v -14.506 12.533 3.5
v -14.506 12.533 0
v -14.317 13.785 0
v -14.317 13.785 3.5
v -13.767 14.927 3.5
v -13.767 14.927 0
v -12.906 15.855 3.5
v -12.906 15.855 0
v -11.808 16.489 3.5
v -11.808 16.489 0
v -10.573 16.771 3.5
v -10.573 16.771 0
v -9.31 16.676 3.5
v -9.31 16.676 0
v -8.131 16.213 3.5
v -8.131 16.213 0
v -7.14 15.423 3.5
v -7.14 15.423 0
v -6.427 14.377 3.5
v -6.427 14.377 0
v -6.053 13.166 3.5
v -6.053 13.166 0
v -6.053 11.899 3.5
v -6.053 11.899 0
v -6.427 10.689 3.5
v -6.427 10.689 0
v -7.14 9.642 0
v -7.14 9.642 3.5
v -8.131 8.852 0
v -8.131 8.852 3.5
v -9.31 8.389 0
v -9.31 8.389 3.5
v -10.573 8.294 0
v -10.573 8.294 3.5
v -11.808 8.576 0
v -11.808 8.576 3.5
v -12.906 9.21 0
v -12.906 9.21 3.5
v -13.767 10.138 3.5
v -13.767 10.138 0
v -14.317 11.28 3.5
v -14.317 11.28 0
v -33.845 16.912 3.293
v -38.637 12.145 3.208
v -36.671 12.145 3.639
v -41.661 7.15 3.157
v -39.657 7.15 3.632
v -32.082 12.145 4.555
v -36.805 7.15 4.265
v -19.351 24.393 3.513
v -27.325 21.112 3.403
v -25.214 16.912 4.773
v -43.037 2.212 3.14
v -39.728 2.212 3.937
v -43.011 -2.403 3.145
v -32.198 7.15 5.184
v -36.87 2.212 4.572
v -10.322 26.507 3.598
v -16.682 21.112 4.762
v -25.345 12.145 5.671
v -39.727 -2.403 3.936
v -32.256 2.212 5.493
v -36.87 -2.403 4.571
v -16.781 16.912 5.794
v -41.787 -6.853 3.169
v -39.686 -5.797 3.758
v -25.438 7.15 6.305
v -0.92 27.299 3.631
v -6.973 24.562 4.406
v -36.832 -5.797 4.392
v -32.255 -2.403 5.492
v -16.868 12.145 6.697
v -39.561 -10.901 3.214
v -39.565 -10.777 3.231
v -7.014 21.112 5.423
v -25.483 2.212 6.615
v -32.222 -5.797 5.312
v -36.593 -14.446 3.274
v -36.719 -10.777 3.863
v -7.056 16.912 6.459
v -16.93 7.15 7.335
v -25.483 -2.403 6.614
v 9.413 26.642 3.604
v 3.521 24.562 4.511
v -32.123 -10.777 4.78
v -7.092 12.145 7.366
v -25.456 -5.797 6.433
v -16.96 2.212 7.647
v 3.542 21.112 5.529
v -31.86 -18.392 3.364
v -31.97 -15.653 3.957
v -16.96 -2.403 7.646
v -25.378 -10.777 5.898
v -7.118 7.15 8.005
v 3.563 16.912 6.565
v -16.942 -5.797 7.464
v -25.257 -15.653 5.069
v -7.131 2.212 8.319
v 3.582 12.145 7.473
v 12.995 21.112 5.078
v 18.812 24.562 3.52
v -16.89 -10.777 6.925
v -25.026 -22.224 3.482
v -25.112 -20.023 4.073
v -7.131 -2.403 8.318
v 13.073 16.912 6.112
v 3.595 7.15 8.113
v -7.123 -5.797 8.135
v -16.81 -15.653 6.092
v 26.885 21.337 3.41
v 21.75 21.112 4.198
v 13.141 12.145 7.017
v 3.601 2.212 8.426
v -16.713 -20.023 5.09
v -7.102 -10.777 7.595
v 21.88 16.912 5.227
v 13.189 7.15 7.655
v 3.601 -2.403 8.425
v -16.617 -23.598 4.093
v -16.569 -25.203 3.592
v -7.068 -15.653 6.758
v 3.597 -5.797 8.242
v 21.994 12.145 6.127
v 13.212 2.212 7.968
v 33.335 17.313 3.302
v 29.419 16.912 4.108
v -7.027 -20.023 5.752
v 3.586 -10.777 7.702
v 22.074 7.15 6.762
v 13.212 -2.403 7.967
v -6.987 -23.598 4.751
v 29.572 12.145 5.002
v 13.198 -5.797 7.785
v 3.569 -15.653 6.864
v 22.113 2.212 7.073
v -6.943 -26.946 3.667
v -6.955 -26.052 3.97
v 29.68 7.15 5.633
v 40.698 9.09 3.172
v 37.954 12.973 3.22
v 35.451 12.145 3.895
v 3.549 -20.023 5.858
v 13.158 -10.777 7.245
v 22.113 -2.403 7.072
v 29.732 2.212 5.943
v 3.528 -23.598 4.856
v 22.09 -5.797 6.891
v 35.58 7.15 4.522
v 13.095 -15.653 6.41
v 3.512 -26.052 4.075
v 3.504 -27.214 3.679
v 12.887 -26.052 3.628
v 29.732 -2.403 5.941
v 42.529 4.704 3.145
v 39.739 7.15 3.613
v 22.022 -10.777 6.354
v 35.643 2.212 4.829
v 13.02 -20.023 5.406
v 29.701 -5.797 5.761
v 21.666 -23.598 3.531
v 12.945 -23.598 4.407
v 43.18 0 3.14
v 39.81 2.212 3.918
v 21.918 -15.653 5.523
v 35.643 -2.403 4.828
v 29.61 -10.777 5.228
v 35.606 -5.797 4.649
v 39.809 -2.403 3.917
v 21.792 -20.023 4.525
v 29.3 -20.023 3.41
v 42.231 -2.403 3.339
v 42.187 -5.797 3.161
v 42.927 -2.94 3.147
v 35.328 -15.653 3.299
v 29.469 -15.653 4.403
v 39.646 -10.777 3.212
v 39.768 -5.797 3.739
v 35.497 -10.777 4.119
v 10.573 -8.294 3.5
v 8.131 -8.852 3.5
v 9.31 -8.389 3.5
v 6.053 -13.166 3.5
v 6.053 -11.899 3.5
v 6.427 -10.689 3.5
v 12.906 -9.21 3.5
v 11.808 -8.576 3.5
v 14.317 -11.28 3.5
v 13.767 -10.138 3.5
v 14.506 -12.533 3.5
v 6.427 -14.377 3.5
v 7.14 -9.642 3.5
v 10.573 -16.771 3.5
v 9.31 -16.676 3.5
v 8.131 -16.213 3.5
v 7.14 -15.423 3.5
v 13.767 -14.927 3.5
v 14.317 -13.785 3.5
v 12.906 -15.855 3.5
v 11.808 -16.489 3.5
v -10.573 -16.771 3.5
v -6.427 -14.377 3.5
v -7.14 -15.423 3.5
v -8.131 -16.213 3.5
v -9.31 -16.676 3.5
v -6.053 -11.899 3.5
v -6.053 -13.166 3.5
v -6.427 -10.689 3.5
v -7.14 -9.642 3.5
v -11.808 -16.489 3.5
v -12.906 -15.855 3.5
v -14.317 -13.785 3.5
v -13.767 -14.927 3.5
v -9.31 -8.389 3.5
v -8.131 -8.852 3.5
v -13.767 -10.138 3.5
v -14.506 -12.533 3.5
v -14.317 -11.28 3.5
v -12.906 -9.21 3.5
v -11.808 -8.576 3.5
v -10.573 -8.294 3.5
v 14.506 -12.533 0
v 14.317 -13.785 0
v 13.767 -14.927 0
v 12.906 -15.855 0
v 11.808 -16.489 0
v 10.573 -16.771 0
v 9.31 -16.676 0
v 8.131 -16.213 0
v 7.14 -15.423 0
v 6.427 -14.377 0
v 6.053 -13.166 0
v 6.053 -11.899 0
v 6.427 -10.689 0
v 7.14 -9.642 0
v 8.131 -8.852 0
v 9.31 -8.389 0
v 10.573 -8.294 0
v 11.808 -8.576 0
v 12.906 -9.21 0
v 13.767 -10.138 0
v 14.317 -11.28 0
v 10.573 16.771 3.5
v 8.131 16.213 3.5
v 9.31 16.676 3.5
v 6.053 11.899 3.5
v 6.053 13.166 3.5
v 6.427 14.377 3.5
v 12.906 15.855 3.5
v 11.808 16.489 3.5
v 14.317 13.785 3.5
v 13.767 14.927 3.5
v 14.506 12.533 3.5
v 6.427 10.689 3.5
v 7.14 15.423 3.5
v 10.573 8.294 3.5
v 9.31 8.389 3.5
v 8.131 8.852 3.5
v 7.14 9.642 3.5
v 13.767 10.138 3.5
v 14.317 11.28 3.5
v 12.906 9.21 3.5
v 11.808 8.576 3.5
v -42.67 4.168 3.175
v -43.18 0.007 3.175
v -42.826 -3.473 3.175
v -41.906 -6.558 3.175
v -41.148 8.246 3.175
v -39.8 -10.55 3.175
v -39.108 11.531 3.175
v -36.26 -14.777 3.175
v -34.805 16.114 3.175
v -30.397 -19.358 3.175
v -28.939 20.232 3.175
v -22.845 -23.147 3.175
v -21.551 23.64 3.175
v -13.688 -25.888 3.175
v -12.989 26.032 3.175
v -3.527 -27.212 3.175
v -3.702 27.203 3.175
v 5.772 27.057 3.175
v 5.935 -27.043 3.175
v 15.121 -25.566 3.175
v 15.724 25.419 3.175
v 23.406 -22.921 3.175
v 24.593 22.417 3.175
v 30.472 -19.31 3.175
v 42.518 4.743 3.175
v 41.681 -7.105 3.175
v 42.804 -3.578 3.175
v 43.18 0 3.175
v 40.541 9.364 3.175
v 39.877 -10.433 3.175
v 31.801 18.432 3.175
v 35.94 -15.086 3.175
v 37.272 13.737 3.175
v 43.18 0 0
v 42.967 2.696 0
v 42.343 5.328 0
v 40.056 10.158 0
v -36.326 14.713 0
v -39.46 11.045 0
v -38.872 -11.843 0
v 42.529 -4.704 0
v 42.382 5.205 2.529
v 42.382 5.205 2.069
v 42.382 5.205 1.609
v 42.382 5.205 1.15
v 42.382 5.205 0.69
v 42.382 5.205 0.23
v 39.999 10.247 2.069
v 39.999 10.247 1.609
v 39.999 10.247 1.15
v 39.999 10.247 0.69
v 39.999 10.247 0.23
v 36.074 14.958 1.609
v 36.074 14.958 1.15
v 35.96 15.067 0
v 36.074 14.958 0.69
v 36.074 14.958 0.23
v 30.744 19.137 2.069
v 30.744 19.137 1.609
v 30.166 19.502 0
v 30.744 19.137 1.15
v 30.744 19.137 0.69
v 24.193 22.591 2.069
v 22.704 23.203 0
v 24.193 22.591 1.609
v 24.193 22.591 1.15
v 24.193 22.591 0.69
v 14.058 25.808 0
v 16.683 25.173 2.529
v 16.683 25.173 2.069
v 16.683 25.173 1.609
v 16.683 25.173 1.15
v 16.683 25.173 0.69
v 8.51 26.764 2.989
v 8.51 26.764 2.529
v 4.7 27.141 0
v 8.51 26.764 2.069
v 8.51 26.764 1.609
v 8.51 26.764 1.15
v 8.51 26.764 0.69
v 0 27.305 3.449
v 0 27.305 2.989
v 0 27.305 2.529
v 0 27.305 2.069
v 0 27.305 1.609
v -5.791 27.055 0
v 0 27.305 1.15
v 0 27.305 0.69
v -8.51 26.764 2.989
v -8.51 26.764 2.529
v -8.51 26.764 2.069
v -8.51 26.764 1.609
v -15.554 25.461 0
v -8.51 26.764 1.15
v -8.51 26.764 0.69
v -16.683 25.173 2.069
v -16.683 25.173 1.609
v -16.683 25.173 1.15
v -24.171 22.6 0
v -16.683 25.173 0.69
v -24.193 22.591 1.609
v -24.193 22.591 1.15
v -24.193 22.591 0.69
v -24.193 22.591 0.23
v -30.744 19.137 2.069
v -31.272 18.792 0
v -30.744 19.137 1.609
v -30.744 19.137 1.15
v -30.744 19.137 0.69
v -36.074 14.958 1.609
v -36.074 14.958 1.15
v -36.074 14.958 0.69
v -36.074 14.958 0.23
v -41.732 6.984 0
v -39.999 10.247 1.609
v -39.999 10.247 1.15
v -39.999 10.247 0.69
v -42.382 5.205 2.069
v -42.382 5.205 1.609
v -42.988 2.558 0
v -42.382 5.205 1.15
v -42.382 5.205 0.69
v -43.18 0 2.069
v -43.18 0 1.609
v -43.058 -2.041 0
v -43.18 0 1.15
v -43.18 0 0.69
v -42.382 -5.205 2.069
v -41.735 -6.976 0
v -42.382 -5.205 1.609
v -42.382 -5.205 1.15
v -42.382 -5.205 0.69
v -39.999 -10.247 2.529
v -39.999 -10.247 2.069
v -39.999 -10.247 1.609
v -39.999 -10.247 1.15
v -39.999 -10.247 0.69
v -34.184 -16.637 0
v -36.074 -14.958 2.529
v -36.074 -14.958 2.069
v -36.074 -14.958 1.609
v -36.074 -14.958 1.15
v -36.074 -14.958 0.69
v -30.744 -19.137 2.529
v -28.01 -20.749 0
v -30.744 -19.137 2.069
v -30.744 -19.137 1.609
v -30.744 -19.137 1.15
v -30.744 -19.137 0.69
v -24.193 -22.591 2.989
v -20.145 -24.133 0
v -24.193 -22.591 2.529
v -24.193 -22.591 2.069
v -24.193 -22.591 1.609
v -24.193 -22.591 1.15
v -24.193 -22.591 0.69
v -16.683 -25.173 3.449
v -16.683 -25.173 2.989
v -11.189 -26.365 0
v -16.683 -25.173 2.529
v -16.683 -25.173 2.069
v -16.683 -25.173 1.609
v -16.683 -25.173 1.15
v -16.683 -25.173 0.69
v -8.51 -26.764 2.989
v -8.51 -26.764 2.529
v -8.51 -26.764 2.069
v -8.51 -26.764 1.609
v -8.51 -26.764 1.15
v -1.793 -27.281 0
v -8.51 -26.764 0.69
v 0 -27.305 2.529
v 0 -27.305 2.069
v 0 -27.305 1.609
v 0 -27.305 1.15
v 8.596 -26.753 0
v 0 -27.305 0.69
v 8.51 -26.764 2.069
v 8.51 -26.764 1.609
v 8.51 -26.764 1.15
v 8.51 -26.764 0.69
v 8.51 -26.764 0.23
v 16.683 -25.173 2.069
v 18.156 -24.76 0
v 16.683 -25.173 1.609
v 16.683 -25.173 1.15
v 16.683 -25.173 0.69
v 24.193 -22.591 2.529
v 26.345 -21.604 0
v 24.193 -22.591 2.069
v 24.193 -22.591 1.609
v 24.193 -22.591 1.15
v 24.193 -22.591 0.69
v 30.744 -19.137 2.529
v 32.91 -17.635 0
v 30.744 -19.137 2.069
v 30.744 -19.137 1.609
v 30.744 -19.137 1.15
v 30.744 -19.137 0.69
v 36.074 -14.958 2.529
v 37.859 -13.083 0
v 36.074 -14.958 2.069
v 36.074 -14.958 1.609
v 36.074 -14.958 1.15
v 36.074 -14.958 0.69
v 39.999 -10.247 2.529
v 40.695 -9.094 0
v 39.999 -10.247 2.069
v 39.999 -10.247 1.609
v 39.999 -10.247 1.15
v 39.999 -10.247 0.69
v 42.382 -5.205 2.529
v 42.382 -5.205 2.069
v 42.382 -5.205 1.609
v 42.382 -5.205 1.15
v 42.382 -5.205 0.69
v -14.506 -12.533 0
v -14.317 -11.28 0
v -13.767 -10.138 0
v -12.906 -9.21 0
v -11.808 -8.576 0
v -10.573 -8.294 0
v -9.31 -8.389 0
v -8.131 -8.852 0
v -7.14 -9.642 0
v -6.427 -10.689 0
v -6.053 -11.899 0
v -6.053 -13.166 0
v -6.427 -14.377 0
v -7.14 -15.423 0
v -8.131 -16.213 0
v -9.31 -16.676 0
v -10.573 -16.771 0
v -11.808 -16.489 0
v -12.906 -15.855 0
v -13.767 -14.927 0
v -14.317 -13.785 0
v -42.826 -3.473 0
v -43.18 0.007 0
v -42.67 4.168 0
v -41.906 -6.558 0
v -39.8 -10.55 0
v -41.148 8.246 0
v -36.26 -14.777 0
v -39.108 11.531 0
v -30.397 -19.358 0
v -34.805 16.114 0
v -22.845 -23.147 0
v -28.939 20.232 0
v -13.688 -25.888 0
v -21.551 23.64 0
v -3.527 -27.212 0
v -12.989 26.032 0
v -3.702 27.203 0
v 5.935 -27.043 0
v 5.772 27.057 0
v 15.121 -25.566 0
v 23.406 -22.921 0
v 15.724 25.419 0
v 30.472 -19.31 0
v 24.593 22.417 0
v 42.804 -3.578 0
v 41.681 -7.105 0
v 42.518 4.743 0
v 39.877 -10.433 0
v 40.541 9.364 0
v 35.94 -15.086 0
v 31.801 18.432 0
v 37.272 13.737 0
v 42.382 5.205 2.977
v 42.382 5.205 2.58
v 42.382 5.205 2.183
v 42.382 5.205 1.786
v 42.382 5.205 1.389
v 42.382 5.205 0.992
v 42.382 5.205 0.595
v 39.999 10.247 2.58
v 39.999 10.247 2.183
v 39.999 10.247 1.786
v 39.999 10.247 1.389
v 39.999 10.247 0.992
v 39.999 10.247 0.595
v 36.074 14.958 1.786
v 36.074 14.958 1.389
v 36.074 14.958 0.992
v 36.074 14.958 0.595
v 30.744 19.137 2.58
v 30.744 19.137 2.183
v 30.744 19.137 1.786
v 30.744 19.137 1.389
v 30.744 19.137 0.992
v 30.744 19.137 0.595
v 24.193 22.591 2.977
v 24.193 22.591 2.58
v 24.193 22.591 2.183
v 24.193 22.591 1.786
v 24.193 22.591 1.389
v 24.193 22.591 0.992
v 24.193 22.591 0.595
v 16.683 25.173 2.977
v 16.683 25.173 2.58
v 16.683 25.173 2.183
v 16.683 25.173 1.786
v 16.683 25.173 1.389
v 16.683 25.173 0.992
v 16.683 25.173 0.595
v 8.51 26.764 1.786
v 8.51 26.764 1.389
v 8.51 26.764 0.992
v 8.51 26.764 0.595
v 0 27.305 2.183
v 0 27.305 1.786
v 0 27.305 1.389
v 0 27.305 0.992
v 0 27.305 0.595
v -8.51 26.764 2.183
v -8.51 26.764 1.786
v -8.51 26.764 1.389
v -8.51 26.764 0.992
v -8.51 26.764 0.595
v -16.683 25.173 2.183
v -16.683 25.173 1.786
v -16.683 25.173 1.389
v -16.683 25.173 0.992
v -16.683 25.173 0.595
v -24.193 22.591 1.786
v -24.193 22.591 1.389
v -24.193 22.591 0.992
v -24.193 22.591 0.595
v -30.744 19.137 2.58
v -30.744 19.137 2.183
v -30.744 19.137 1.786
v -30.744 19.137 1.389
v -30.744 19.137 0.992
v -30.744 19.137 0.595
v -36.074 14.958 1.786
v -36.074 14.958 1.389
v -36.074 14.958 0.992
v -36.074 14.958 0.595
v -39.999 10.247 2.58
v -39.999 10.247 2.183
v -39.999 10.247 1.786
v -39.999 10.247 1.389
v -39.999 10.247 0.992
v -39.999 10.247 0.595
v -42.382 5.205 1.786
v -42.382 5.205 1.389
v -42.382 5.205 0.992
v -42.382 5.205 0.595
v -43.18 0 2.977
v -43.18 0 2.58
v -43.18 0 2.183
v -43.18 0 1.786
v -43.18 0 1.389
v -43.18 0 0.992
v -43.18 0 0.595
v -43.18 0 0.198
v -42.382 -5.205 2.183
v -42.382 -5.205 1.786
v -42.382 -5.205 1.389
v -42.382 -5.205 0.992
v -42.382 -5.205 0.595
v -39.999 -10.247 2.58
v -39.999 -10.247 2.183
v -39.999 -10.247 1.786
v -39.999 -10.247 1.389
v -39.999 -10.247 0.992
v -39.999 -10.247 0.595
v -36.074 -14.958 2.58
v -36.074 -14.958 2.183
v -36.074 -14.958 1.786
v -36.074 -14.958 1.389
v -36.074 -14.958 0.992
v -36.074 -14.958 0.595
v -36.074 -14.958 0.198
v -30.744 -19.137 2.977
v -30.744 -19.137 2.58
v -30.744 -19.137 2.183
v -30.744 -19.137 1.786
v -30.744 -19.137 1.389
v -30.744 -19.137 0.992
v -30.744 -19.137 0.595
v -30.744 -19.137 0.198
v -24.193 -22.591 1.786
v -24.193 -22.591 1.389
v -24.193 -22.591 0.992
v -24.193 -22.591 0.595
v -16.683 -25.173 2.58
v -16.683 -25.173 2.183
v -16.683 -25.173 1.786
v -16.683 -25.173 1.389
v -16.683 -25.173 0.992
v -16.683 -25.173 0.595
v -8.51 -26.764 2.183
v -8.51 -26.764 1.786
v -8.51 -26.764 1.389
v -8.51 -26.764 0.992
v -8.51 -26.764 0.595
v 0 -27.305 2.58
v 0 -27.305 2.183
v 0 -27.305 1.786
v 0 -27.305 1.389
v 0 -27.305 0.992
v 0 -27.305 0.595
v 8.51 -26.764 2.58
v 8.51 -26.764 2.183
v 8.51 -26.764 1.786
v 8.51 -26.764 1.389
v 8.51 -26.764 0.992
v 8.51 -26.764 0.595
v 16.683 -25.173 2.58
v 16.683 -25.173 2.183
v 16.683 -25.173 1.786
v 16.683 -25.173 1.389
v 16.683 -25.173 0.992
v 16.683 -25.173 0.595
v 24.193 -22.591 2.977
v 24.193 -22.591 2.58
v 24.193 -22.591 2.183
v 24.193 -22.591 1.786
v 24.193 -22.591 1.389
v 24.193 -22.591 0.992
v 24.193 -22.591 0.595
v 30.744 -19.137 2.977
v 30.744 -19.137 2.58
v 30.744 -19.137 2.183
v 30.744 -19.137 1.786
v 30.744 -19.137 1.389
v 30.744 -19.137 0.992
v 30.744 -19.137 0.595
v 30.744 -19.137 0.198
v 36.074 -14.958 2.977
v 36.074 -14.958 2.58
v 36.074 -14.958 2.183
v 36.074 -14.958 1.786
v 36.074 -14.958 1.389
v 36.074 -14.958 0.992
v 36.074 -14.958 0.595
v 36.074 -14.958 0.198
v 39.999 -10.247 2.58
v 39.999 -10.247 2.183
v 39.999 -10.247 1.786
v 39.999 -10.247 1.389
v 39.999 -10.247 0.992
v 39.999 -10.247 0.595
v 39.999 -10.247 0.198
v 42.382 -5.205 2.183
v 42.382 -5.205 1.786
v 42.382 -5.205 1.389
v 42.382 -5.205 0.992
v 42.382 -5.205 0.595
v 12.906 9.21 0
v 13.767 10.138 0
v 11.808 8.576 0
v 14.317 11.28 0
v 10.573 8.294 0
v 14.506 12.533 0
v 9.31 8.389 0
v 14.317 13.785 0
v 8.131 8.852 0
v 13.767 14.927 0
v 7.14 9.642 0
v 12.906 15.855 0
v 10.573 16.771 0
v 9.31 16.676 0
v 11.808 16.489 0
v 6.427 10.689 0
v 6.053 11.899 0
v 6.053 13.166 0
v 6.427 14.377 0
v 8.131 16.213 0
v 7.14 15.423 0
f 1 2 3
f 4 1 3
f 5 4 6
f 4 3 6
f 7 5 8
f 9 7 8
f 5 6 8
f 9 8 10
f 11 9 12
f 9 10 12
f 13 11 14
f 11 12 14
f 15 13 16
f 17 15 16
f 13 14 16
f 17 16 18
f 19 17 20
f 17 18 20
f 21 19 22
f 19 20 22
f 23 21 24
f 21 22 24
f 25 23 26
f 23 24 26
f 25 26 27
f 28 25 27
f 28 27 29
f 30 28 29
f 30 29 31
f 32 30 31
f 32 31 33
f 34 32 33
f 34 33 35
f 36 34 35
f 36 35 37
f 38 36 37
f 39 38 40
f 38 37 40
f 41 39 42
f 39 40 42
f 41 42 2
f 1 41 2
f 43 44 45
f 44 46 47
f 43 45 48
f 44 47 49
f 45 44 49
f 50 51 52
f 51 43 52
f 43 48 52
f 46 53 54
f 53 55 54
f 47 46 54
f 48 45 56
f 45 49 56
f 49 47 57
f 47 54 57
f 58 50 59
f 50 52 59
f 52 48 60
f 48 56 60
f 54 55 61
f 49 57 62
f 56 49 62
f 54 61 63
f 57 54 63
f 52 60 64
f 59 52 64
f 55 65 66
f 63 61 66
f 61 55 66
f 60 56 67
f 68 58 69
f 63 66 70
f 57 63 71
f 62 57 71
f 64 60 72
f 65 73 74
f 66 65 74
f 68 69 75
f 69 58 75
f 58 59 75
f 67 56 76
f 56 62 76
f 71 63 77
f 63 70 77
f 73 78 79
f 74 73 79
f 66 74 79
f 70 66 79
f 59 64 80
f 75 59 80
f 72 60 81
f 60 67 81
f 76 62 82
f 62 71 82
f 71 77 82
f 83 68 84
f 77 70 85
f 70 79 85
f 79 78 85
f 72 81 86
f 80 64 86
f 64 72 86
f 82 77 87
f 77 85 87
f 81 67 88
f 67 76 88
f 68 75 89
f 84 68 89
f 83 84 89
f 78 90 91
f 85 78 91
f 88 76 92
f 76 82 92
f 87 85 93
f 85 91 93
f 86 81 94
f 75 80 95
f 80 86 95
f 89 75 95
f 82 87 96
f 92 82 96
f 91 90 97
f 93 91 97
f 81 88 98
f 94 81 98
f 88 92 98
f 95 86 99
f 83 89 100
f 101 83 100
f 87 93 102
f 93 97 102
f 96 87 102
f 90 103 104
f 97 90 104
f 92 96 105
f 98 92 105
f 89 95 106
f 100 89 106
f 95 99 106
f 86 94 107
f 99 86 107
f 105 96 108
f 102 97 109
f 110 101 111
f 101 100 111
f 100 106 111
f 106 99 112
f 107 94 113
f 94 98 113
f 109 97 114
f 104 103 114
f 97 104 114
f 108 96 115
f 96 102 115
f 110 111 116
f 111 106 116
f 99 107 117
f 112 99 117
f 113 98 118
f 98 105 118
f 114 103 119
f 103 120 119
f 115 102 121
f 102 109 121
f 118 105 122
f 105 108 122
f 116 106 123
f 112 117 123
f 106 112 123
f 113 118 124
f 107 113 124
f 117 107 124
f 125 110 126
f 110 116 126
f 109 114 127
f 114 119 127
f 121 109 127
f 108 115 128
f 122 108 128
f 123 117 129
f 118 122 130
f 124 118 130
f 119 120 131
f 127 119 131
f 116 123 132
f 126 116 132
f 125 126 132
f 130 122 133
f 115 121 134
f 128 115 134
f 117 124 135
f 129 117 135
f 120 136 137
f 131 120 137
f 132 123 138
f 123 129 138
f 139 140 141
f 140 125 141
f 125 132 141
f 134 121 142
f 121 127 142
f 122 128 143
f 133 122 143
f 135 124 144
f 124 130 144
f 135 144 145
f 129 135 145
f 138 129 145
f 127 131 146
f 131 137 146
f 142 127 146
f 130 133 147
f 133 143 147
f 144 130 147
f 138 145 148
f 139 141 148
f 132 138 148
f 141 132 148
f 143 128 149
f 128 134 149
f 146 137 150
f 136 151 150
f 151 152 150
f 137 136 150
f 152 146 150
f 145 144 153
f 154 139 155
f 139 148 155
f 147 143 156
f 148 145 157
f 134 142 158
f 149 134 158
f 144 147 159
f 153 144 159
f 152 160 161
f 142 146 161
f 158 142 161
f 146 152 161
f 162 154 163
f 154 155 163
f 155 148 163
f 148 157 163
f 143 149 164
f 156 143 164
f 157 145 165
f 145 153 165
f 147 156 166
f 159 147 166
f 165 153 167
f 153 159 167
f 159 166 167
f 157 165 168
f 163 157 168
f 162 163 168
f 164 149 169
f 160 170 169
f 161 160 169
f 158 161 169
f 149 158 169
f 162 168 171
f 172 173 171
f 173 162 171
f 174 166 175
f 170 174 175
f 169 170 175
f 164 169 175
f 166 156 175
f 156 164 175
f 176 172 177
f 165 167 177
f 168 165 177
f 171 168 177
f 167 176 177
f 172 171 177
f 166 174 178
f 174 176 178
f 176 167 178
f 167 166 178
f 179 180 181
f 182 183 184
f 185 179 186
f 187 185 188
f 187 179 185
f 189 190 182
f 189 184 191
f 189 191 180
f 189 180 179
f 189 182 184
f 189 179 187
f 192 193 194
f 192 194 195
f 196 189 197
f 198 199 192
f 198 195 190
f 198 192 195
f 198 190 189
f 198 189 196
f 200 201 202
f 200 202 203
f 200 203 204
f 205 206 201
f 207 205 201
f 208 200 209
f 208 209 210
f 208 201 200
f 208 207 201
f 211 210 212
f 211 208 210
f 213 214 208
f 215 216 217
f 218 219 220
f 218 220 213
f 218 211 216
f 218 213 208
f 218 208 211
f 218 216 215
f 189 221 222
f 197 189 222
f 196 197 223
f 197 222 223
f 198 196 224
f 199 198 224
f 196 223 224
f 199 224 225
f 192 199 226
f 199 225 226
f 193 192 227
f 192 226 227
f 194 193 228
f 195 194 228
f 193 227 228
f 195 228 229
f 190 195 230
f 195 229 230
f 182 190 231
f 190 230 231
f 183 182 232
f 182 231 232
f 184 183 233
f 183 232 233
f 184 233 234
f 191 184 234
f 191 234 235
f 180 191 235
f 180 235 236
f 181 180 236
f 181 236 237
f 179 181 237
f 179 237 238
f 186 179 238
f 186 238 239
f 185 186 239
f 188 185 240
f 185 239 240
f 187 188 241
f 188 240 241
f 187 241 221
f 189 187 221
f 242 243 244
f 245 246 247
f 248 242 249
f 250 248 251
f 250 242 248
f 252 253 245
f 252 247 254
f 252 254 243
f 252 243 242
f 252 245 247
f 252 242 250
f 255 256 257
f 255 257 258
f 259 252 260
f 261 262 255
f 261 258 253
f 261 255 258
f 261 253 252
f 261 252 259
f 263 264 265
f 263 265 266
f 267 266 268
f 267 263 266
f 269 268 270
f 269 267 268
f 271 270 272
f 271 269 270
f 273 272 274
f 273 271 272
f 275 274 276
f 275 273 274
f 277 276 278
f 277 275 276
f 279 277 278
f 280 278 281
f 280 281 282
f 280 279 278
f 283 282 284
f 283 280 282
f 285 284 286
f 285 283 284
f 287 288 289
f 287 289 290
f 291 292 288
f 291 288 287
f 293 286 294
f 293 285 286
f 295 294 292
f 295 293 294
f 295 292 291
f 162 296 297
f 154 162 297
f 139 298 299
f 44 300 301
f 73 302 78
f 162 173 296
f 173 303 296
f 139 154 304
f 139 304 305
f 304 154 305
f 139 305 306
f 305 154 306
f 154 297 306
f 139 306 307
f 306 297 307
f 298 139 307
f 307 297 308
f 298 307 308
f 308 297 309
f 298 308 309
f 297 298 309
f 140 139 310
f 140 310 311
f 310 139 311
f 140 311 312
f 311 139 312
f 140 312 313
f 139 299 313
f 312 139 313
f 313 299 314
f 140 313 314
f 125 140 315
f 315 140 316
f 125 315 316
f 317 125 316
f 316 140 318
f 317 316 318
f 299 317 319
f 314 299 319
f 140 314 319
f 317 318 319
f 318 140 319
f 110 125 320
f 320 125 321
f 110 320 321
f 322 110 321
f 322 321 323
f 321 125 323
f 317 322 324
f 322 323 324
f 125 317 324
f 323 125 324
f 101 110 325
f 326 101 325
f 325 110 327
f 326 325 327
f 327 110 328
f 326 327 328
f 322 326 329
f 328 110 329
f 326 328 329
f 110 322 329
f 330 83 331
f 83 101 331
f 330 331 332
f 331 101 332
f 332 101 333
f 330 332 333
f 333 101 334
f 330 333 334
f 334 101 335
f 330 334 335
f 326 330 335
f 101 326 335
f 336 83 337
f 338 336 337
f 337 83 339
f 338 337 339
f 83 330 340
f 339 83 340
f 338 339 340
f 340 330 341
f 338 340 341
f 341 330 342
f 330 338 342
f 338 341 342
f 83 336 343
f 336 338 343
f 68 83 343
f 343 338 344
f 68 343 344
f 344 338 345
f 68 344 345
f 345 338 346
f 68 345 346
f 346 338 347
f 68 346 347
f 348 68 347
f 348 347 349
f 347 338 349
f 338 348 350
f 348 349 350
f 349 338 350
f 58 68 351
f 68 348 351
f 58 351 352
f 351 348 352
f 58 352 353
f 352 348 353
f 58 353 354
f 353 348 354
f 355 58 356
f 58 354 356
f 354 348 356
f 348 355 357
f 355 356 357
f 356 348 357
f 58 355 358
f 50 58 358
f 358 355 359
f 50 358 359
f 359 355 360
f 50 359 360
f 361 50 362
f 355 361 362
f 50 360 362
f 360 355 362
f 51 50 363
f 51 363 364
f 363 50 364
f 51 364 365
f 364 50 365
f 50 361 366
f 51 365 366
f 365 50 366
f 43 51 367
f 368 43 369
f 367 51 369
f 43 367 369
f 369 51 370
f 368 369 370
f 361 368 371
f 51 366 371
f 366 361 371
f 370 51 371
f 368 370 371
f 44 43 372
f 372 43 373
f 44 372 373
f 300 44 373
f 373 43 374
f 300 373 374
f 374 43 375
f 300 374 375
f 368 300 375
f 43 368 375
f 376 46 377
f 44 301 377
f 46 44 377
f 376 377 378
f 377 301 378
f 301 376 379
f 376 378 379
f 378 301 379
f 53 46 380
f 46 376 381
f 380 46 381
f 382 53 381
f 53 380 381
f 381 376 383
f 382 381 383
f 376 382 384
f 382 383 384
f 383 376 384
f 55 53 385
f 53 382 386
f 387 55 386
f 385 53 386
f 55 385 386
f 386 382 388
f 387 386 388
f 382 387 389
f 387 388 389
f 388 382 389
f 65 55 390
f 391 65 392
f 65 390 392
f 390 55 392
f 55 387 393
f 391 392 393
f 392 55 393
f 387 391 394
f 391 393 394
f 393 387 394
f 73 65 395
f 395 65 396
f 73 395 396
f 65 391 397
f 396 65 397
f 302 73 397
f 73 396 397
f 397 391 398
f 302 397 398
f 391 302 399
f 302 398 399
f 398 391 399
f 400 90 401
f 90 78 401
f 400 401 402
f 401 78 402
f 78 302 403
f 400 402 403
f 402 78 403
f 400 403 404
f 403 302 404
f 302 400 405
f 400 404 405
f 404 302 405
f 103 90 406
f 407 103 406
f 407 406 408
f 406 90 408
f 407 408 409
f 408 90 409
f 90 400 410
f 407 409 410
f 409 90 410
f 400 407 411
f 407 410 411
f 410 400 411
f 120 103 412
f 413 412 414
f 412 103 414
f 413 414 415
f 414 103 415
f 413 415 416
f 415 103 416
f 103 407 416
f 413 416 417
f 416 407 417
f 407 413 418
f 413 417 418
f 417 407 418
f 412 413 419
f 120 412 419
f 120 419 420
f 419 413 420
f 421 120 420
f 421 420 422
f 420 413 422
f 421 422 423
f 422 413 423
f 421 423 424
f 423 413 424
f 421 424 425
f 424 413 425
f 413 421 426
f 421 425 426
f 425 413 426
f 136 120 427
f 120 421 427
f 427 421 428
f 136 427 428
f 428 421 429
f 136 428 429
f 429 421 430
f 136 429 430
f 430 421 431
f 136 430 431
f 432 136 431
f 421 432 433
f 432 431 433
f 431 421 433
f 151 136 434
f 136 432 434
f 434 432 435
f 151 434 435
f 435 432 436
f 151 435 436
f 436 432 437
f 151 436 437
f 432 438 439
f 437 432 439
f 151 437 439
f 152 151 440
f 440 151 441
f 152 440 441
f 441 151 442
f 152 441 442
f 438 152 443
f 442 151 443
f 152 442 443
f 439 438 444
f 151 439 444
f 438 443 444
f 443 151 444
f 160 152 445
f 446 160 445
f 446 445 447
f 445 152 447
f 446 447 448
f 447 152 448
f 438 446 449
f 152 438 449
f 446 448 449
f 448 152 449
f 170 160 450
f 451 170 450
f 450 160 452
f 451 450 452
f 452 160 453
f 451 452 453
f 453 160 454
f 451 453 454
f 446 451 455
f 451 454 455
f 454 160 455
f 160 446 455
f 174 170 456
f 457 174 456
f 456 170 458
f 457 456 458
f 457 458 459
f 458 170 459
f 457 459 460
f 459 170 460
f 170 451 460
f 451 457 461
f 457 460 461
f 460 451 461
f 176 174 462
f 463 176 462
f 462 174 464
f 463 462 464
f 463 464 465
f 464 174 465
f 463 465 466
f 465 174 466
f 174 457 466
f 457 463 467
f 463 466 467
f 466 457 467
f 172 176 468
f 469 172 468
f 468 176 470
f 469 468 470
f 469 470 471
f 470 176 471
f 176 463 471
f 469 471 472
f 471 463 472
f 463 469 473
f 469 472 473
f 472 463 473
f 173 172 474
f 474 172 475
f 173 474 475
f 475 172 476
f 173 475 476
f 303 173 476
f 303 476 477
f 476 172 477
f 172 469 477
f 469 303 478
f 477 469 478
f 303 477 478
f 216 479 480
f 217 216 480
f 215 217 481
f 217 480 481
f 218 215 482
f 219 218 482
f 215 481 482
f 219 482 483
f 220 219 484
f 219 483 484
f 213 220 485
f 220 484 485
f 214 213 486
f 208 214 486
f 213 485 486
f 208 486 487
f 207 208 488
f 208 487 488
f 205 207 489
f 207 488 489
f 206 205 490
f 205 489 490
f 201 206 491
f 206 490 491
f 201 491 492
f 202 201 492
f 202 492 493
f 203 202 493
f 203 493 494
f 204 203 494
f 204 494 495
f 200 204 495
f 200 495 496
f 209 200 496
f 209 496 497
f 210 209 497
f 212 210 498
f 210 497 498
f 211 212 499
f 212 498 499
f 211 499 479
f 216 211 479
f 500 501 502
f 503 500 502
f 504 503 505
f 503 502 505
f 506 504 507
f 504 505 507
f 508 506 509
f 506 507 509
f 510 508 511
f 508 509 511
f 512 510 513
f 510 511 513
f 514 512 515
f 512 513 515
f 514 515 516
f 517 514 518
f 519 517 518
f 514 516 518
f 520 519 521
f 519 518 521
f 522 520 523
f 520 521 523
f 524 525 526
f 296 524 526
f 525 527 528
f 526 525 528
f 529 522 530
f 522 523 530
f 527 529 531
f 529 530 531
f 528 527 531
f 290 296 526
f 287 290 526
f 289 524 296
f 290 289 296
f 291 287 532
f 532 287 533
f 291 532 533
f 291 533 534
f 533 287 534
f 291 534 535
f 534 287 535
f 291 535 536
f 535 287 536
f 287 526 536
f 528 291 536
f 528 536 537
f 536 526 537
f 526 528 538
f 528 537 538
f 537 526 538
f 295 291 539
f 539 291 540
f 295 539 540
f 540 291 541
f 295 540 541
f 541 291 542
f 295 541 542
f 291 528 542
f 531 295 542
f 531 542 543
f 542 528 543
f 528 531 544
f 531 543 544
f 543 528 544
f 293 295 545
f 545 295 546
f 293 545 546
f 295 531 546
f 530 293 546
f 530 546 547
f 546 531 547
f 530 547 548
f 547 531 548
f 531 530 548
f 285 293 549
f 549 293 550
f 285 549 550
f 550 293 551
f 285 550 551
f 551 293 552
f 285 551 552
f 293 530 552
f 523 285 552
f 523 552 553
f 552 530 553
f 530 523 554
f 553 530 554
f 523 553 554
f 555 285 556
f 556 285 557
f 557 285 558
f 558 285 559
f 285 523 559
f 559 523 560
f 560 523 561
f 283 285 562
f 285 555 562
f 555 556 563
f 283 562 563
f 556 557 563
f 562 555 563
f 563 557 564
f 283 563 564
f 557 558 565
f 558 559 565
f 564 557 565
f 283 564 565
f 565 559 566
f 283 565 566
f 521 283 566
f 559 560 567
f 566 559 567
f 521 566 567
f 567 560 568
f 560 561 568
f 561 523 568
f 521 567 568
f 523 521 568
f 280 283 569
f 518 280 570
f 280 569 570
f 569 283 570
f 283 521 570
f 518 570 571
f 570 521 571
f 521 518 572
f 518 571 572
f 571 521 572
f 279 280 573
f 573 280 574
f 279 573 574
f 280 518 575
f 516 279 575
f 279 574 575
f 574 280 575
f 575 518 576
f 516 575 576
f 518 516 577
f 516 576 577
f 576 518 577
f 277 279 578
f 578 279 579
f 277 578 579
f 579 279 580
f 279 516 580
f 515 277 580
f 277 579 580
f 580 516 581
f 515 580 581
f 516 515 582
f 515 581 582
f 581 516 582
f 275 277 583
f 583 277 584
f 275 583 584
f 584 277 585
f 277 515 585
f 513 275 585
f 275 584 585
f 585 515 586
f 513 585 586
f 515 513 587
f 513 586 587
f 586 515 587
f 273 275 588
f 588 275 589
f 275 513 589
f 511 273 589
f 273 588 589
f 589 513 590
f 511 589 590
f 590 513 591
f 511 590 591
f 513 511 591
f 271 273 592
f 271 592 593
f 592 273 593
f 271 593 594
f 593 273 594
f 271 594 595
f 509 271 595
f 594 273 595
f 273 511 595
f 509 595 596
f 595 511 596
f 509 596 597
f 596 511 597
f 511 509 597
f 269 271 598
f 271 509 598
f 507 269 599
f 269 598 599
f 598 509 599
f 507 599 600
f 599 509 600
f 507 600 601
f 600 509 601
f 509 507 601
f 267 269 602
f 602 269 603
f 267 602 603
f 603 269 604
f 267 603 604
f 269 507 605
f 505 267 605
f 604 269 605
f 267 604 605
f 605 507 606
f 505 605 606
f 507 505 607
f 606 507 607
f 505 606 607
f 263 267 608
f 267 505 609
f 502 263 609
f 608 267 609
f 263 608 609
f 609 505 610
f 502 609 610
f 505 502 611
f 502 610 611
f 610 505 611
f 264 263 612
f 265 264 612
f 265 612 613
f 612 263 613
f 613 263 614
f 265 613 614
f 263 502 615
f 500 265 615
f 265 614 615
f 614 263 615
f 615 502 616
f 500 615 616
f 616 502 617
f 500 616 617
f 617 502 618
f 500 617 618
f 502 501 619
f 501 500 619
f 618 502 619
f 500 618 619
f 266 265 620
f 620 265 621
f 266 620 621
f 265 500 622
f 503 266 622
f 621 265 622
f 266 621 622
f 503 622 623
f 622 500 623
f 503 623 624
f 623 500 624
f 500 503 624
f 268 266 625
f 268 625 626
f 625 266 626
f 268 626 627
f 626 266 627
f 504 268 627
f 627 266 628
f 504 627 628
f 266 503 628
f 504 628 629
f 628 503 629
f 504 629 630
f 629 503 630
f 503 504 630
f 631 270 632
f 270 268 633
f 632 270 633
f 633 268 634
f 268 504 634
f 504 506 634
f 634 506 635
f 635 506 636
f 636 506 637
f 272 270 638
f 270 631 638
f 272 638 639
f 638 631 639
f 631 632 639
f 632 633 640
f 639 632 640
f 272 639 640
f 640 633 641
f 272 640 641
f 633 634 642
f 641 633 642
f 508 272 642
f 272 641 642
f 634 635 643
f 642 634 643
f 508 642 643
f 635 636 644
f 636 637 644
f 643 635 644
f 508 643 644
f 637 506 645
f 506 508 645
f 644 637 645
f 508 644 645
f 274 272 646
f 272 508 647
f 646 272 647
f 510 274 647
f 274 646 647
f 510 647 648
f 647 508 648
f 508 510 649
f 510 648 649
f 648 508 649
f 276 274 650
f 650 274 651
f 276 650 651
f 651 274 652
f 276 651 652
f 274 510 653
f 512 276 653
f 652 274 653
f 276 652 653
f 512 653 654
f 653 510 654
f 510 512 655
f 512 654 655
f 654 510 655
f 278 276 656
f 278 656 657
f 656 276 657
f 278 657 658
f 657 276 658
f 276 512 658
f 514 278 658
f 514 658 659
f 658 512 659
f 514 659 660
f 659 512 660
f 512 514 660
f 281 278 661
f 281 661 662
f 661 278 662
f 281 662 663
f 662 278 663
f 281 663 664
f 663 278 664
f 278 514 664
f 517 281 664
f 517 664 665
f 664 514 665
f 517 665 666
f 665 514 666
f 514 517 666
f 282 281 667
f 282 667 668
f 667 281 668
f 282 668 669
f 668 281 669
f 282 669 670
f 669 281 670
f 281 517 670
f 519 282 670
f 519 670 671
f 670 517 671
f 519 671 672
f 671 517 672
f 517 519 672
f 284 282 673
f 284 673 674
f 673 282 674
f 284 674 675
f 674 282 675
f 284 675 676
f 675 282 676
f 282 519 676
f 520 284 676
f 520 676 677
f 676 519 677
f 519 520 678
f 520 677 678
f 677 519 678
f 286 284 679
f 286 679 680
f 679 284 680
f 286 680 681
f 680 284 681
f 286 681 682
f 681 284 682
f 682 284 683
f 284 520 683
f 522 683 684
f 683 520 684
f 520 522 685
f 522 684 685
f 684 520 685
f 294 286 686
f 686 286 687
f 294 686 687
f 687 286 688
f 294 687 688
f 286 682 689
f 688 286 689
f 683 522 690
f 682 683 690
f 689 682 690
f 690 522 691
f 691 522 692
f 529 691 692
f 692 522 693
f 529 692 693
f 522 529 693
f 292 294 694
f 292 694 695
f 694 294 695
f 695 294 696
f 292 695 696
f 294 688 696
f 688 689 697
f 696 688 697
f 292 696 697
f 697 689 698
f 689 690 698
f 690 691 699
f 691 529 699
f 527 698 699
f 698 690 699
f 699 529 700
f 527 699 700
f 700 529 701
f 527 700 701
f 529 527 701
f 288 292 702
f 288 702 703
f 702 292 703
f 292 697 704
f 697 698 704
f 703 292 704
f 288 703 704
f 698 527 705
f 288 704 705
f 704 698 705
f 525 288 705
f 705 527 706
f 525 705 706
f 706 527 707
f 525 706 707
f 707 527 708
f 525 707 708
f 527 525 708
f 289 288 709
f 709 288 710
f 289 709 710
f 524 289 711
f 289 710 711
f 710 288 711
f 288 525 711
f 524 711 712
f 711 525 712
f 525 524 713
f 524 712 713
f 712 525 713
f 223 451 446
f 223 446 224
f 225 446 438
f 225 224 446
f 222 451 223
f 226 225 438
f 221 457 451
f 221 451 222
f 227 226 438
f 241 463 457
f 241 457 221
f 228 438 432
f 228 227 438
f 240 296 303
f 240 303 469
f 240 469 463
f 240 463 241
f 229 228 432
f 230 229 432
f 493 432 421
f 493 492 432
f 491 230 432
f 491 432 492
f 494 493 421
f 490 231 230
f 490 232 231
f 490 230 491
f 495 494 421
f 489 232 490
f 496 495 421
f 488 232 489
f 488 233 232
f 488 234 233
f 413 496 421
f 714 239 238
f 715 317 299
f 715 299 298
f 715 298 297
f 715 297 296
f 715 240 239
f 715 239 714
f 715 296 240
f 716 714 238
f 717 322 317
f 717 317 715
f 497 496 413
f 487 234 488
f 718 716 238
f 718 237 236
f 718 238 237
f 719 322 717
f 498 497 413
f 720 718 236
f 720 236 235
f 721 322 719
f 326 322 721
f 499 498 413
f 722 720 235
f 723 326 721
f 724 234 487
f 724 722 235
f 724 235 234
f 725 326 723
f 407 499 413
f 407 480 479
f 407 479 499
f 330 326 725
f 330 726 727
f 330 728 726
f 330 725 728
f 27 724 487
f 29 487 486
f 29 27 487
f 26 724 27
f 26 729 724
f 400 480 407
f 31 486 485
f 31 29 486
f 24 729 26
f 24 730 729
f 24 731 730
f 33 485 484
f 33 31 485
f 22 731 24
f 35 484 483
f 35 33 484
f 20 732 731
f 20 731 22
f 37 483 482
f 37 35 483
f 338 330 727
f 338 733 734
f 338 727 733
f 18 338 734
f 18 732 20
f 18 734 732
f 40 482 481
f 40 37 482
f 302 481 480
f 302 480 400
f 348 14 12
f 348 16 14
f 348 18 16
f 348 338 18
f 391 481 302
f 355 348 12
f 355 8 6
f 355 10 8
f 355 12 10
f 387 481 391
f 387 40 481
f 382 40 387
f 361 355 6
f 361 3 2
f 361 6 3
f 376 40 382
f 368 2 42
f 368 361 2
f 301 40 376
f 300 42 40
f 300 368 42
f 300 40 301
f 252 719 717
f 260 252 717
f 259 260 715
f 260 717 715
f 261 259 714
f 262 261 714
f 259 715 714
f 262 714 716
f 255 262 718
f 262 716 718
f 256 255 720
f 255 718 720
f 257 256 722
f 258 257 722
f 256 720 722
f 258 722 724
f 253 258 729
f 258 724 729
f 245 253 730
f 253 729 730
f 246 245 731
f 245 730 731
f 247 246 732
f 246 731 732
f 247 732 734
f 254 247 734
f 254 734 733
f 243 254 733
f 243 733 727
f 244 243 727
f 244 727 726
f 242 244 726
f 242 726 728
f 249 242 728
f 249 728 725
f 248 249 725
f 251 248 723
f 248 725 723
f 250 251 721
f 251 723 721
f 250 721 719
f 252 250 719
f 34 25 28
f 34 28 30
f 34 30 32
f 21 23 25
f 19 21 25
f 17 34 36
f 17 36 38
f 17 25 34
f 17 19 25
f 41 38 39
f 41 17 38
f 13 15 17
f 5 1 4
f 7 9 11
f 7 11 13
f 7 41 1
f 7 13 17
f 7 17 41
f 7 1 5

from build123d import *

# Parameters (mm, degrees)
BOSS_EXTRUDE1_DEPTH     = 3.175
SKETCH3_R               = 210.872545424
CUT_EXTRUDE1_DEPTH      = 524.129
CUT_EXTRUDE2_DEPTH      = 524.129
CUT_EXTRUDE2_DEPTH_BACK = 524.129
SKETCH4_R               = 61.79011218
BOSS_EXTRUDE2_REACH     = 53.791
SKETCH6_R               = 4.25
CUT_EXTRUDE3_DEPTH      = 3.5


# Read off the part's stored shape, not the designer's step: Boss-Extrude1
with BuildPart() as part:
    # Boss-Extrude1 outline → Boss-Extrude1 (new body)
    with BuildSketch(Plane.XY):
        with BuildLine():
            add(Edge.make_bspline(
                [(43.18, 0), (43.18, 3.487869372), (41.04308468, 10.463608115), (31.572396318, 19.629385836), (17.132135744, 25.842526194), (0, 28.036236903), (-17.132135744, 25.842526194), (-31.572396318, 19.629385836), (-41.04308468, 10.463608115), (-44.24845766, 0), (-41.04308468, -10.463608115), (-31.572396318, -19.629385836), (-17.132135744, -25.842526194), (0, -28.036236903), (17.132135744, -25.842526194), (31.572396318, -19.629385836), (41.04308468, -10.463608115), (43.18, -3.487869372), (43.18, 0)],
                knots=[0, 0, 0, 0, 0.392699082, 0.785398163, 1.178097245, 1.570796327, 1.963495408, 2.35619449, 2.748893572, 3.141592654, 3.534291735, 3.926990817, 4.319689899, 4.71238898, 5.105088062, 5.497787144, 5.890486225, 6.283185307, 6.283185307, 6.283185307, 6.283185307], degree=3))
        make_face()
    extrude(amount=BOSS_EXTRUDE1_DEPTH)


with BuildPart() as body_2:
    # Sketch2 → Revolve1 (revolve)
    with BuildSketch(Plane.XY.offset(-168.171923244)):
        with BuildLine():
            Line((0, 104.775), (0, 111.125))
            add(Edge.make_bspline(
                [(0, 111.125), (-25.6850603, 111.125), (-68.985756192, 107.923102763), (-144.491866473, 82.828551423), (-194.510279111, 0), (-144.662239102, -82.828551423), (-68.463431094, -107.923102763), (-26.812062356, -111.125), (0, -111.125)],
                knots=[0, 0, 0, 0, 0.152479171, 0.306817145, 0.5, 0.693182855, 0.847520829, 1, 1, 1, 1], degree=3))
            Line((0, -111.125), (0, -104.775))
            add(Edge.make_bspline(
                [(0, -104.775), (-0.171719551, -104.775), (-0.339960895, -104.774935341), (-3.053437978, -104.772860622), (-8.190766555, -104.738608012), (-13.107715438, -104.636837025), (-20.568808866, -104.421053121), (-25.339746217, -104.199600548), (-39.238452343, -103.268644468), (-47.950847553, -102.293557604), (-58.827303545, -100.510941168), (-61.00197668, -100.126156808), (-65.367166047, -99.296750098), (-67.559783414, -98.851910173), (-74.171137403, -97.424254002), (-78.611523138, -96.347877617), (-91.895410377, -92.6549551), (-100.700061603, -89.573590942), (-113.299275818, -83.681916807), (-117.398007221, -81.506750773), (-123.333519574, -77.885436226), (-125.276645483, -76.618564852), (-129.082652994, -73.958072983), (-130.943992005, -72.564959693), (-140.052843424, -65.252894529), (-146.694022396, -58.318049468), (-157.867866053, -43.071658706), (-162.398838205, -34.762308754), (-167.071540269, -21.890519252), (-168.276136939, -17.532153192), (-169.902554344, -8.777109056), (-170.324615699, -4.380780105), (-170.315618169, 4.367718599), (-169.884501784, 8.76460805), (-168.240967164, 17.521562319), (-167.028311047, 21.881267793), (-162.335053285, 34.75759435), (-157.795184186, 43.0706108), (-146.626276987, 58.323260071), (-139.998893431, 65.260747179), (-130.930547188, 72.57433306), (-129.078580269, 73.967653828), (-125.293874883, 76.627906362), (-123.362505498, 77.894418251), (-117.463453676, 81.514258744), (-113.390619307, 83.687941868), (-100.856345038, 89.57533659), (-92.077733287, 92.654250235), (-78.738710637, 96.345156511), (-74.264296231, 97.421083231), (-67.570351392, 98.848272549), (-65.344328139, 99.293032902), (-60.903607466, 100.122635351), (-58.687172846, 100.507643111), (-47.596026304, 102.291635707), (-38.693445228, 103.268203901), (-20.105885244, 104.510223459), (-10.420601756, 104.775), (0, 104.775)],
                knots=[0, 0, 0, 0, 0.000976562, 0.000976562, 0.015625, 0.03125, 0.03125, 0.0625, 0.0625, 0.125, 0.125, 0.140625, 0.140625, 0.15625, 0.15625, 0.1875, 0.1875, 0.25, 0.25, 0.28125, 0.28125, 0.296875, 0.296875, 0.3125, 0.3125, 0.375, 0.375, 0.4375, 0.4375, 0.46875, 0.46875, 0.5, 0.5, 0.53125, 0.53125, 0.5625, 0.5625, 0.625, 0.625, 0.6875, 0.6875, 0.703125, 0.703125, 0.71875, 0.71875, 0.75, 0.75, 0.8125, 0.8125, 0.84375, 0.84375, 0.859375, 0.859375, 0.875, 0.875, 0.9375, 0.9375, 1, 1, 1, 1], degree=3))
        make_face()
    revolve(axis=Axis((0, 104.775, -168.171923244), (0, 1, 0)))

    # Sketch3 → Cut-Extrude1 (cut)
    with BuildSketch(Plane.XY):
        Circle(SKETCH3_R)
    extrude(amount=-CUT_EXTRUDE1_DEPTH, mode=Mode.SUBTRACT)

    # Sketch4 → Cut-Extrude2 (cut, two sides: drawn at the far end of the back side and taken through both)
    with BuildSketch(Plane.XY.offset(-CUT_EXTRUDE2_DEPTH_BACK)):
        Circle(SKETCH4_R)
        with BuildLine():
            add(Edge.make_bspline(
                [(43.18, 0), (43.18, 3.487869372), (41.04308468, 10.463608115), (31.572396318, 19.629385836), (17.132135744, 25.842526194), (0, 28.036236903), (-17.132135744, 25.842526194), (-31.572396318, 19.629385836), (-41.04308468, 10.463608115), (-44.24845766, 0), (-41.04308468, -10.463608115), (-31.572396318, -19.629385836), (-17.132135744, -25.842526194), (0, -28.036236903), (17.132135744, -25.842526194), (31.572396318, -19.629385836), (41.04308468, -10.463608115), (43.18, -3.487869372), (43.18, 0)],
                knots=[0, 0, 0, 0, 0.392699082, 0.785398163, 1.178097245, 1.570796327, 1.963495408, 2.35619449, 2.748893572, 3.141592654, 3.534291735, 3.926990817, 4.319689899, 4.71238898, 5.105088062, 5.497787144, 5.890486225, 6.283185307, 6.283185307, 6.283185307, 6.283185307], degree=3))
        make_face(mode=Mode.SUBTRACT)
    extrude(amount=CUT_EXTRUDE2_DEPTH + CUT_EXTRUDE2_DEPTH_BACK, mode=Mode.SUBTRACT)

    # Sketch5 → Boss-Extrude2 (add, up to next)
    with BuildSketch(Plane(origin=(0, 0, 0), x_dir=(-1, 0, 0), z_dir=(0, 0, -1)), mode=Mode.PRIVATE) as boss_extrude2_sk1:
        Polygon((0, 23.110638672), (-33.338053903, 9.22412145), (-31.871168281, -8.671883139), (-9.378922077, -22.265023236), (16.304185416, -20.159850491), (26.315294725, -12.583578131), (31.536274547, 5.533568798), (19.176451365, 17.732058057), align=None)
    boss_extrude2_tool1 = extrude(boss_extrude2_sk1.sketch, amount=-BOSS_EXTRUDE2_REACH, mode=Mode.PRIVATE) - body_2.part
    add(boss_extrude2_tool1.solids().sort_by_distance((0.704013, -0.268334, 0))[0])

    # Sketch6 → Cut-Extrude3 (cut)
    with BuildSketch(Plane(origin=(0, 0, 0), x_dir=(-1, 0, 0), z_dir=(0, 0, -1))):
        with Locations(Location((-10.255774877, -12.532527364, 0), (0, 0, 180))):
            Circle(SKETCH6_R)
        with Locations((10.255774877, 12.532527364)):
            Circle(SKETCH6_R)
        with Locations((10.255774877, -12.532527364)):
            Circle(SKETCH6_R)
        with Locations(Location((-10.255774877, 12.532527364, 0), (0, 0, 180))):
            Circle(SKETCH6_R)
    extrude(amount=-CUT_EXTRUDE3_DEPTH, mode=Mode.SUBTRACT)


solid = Compound([part.part, body_2.part])
